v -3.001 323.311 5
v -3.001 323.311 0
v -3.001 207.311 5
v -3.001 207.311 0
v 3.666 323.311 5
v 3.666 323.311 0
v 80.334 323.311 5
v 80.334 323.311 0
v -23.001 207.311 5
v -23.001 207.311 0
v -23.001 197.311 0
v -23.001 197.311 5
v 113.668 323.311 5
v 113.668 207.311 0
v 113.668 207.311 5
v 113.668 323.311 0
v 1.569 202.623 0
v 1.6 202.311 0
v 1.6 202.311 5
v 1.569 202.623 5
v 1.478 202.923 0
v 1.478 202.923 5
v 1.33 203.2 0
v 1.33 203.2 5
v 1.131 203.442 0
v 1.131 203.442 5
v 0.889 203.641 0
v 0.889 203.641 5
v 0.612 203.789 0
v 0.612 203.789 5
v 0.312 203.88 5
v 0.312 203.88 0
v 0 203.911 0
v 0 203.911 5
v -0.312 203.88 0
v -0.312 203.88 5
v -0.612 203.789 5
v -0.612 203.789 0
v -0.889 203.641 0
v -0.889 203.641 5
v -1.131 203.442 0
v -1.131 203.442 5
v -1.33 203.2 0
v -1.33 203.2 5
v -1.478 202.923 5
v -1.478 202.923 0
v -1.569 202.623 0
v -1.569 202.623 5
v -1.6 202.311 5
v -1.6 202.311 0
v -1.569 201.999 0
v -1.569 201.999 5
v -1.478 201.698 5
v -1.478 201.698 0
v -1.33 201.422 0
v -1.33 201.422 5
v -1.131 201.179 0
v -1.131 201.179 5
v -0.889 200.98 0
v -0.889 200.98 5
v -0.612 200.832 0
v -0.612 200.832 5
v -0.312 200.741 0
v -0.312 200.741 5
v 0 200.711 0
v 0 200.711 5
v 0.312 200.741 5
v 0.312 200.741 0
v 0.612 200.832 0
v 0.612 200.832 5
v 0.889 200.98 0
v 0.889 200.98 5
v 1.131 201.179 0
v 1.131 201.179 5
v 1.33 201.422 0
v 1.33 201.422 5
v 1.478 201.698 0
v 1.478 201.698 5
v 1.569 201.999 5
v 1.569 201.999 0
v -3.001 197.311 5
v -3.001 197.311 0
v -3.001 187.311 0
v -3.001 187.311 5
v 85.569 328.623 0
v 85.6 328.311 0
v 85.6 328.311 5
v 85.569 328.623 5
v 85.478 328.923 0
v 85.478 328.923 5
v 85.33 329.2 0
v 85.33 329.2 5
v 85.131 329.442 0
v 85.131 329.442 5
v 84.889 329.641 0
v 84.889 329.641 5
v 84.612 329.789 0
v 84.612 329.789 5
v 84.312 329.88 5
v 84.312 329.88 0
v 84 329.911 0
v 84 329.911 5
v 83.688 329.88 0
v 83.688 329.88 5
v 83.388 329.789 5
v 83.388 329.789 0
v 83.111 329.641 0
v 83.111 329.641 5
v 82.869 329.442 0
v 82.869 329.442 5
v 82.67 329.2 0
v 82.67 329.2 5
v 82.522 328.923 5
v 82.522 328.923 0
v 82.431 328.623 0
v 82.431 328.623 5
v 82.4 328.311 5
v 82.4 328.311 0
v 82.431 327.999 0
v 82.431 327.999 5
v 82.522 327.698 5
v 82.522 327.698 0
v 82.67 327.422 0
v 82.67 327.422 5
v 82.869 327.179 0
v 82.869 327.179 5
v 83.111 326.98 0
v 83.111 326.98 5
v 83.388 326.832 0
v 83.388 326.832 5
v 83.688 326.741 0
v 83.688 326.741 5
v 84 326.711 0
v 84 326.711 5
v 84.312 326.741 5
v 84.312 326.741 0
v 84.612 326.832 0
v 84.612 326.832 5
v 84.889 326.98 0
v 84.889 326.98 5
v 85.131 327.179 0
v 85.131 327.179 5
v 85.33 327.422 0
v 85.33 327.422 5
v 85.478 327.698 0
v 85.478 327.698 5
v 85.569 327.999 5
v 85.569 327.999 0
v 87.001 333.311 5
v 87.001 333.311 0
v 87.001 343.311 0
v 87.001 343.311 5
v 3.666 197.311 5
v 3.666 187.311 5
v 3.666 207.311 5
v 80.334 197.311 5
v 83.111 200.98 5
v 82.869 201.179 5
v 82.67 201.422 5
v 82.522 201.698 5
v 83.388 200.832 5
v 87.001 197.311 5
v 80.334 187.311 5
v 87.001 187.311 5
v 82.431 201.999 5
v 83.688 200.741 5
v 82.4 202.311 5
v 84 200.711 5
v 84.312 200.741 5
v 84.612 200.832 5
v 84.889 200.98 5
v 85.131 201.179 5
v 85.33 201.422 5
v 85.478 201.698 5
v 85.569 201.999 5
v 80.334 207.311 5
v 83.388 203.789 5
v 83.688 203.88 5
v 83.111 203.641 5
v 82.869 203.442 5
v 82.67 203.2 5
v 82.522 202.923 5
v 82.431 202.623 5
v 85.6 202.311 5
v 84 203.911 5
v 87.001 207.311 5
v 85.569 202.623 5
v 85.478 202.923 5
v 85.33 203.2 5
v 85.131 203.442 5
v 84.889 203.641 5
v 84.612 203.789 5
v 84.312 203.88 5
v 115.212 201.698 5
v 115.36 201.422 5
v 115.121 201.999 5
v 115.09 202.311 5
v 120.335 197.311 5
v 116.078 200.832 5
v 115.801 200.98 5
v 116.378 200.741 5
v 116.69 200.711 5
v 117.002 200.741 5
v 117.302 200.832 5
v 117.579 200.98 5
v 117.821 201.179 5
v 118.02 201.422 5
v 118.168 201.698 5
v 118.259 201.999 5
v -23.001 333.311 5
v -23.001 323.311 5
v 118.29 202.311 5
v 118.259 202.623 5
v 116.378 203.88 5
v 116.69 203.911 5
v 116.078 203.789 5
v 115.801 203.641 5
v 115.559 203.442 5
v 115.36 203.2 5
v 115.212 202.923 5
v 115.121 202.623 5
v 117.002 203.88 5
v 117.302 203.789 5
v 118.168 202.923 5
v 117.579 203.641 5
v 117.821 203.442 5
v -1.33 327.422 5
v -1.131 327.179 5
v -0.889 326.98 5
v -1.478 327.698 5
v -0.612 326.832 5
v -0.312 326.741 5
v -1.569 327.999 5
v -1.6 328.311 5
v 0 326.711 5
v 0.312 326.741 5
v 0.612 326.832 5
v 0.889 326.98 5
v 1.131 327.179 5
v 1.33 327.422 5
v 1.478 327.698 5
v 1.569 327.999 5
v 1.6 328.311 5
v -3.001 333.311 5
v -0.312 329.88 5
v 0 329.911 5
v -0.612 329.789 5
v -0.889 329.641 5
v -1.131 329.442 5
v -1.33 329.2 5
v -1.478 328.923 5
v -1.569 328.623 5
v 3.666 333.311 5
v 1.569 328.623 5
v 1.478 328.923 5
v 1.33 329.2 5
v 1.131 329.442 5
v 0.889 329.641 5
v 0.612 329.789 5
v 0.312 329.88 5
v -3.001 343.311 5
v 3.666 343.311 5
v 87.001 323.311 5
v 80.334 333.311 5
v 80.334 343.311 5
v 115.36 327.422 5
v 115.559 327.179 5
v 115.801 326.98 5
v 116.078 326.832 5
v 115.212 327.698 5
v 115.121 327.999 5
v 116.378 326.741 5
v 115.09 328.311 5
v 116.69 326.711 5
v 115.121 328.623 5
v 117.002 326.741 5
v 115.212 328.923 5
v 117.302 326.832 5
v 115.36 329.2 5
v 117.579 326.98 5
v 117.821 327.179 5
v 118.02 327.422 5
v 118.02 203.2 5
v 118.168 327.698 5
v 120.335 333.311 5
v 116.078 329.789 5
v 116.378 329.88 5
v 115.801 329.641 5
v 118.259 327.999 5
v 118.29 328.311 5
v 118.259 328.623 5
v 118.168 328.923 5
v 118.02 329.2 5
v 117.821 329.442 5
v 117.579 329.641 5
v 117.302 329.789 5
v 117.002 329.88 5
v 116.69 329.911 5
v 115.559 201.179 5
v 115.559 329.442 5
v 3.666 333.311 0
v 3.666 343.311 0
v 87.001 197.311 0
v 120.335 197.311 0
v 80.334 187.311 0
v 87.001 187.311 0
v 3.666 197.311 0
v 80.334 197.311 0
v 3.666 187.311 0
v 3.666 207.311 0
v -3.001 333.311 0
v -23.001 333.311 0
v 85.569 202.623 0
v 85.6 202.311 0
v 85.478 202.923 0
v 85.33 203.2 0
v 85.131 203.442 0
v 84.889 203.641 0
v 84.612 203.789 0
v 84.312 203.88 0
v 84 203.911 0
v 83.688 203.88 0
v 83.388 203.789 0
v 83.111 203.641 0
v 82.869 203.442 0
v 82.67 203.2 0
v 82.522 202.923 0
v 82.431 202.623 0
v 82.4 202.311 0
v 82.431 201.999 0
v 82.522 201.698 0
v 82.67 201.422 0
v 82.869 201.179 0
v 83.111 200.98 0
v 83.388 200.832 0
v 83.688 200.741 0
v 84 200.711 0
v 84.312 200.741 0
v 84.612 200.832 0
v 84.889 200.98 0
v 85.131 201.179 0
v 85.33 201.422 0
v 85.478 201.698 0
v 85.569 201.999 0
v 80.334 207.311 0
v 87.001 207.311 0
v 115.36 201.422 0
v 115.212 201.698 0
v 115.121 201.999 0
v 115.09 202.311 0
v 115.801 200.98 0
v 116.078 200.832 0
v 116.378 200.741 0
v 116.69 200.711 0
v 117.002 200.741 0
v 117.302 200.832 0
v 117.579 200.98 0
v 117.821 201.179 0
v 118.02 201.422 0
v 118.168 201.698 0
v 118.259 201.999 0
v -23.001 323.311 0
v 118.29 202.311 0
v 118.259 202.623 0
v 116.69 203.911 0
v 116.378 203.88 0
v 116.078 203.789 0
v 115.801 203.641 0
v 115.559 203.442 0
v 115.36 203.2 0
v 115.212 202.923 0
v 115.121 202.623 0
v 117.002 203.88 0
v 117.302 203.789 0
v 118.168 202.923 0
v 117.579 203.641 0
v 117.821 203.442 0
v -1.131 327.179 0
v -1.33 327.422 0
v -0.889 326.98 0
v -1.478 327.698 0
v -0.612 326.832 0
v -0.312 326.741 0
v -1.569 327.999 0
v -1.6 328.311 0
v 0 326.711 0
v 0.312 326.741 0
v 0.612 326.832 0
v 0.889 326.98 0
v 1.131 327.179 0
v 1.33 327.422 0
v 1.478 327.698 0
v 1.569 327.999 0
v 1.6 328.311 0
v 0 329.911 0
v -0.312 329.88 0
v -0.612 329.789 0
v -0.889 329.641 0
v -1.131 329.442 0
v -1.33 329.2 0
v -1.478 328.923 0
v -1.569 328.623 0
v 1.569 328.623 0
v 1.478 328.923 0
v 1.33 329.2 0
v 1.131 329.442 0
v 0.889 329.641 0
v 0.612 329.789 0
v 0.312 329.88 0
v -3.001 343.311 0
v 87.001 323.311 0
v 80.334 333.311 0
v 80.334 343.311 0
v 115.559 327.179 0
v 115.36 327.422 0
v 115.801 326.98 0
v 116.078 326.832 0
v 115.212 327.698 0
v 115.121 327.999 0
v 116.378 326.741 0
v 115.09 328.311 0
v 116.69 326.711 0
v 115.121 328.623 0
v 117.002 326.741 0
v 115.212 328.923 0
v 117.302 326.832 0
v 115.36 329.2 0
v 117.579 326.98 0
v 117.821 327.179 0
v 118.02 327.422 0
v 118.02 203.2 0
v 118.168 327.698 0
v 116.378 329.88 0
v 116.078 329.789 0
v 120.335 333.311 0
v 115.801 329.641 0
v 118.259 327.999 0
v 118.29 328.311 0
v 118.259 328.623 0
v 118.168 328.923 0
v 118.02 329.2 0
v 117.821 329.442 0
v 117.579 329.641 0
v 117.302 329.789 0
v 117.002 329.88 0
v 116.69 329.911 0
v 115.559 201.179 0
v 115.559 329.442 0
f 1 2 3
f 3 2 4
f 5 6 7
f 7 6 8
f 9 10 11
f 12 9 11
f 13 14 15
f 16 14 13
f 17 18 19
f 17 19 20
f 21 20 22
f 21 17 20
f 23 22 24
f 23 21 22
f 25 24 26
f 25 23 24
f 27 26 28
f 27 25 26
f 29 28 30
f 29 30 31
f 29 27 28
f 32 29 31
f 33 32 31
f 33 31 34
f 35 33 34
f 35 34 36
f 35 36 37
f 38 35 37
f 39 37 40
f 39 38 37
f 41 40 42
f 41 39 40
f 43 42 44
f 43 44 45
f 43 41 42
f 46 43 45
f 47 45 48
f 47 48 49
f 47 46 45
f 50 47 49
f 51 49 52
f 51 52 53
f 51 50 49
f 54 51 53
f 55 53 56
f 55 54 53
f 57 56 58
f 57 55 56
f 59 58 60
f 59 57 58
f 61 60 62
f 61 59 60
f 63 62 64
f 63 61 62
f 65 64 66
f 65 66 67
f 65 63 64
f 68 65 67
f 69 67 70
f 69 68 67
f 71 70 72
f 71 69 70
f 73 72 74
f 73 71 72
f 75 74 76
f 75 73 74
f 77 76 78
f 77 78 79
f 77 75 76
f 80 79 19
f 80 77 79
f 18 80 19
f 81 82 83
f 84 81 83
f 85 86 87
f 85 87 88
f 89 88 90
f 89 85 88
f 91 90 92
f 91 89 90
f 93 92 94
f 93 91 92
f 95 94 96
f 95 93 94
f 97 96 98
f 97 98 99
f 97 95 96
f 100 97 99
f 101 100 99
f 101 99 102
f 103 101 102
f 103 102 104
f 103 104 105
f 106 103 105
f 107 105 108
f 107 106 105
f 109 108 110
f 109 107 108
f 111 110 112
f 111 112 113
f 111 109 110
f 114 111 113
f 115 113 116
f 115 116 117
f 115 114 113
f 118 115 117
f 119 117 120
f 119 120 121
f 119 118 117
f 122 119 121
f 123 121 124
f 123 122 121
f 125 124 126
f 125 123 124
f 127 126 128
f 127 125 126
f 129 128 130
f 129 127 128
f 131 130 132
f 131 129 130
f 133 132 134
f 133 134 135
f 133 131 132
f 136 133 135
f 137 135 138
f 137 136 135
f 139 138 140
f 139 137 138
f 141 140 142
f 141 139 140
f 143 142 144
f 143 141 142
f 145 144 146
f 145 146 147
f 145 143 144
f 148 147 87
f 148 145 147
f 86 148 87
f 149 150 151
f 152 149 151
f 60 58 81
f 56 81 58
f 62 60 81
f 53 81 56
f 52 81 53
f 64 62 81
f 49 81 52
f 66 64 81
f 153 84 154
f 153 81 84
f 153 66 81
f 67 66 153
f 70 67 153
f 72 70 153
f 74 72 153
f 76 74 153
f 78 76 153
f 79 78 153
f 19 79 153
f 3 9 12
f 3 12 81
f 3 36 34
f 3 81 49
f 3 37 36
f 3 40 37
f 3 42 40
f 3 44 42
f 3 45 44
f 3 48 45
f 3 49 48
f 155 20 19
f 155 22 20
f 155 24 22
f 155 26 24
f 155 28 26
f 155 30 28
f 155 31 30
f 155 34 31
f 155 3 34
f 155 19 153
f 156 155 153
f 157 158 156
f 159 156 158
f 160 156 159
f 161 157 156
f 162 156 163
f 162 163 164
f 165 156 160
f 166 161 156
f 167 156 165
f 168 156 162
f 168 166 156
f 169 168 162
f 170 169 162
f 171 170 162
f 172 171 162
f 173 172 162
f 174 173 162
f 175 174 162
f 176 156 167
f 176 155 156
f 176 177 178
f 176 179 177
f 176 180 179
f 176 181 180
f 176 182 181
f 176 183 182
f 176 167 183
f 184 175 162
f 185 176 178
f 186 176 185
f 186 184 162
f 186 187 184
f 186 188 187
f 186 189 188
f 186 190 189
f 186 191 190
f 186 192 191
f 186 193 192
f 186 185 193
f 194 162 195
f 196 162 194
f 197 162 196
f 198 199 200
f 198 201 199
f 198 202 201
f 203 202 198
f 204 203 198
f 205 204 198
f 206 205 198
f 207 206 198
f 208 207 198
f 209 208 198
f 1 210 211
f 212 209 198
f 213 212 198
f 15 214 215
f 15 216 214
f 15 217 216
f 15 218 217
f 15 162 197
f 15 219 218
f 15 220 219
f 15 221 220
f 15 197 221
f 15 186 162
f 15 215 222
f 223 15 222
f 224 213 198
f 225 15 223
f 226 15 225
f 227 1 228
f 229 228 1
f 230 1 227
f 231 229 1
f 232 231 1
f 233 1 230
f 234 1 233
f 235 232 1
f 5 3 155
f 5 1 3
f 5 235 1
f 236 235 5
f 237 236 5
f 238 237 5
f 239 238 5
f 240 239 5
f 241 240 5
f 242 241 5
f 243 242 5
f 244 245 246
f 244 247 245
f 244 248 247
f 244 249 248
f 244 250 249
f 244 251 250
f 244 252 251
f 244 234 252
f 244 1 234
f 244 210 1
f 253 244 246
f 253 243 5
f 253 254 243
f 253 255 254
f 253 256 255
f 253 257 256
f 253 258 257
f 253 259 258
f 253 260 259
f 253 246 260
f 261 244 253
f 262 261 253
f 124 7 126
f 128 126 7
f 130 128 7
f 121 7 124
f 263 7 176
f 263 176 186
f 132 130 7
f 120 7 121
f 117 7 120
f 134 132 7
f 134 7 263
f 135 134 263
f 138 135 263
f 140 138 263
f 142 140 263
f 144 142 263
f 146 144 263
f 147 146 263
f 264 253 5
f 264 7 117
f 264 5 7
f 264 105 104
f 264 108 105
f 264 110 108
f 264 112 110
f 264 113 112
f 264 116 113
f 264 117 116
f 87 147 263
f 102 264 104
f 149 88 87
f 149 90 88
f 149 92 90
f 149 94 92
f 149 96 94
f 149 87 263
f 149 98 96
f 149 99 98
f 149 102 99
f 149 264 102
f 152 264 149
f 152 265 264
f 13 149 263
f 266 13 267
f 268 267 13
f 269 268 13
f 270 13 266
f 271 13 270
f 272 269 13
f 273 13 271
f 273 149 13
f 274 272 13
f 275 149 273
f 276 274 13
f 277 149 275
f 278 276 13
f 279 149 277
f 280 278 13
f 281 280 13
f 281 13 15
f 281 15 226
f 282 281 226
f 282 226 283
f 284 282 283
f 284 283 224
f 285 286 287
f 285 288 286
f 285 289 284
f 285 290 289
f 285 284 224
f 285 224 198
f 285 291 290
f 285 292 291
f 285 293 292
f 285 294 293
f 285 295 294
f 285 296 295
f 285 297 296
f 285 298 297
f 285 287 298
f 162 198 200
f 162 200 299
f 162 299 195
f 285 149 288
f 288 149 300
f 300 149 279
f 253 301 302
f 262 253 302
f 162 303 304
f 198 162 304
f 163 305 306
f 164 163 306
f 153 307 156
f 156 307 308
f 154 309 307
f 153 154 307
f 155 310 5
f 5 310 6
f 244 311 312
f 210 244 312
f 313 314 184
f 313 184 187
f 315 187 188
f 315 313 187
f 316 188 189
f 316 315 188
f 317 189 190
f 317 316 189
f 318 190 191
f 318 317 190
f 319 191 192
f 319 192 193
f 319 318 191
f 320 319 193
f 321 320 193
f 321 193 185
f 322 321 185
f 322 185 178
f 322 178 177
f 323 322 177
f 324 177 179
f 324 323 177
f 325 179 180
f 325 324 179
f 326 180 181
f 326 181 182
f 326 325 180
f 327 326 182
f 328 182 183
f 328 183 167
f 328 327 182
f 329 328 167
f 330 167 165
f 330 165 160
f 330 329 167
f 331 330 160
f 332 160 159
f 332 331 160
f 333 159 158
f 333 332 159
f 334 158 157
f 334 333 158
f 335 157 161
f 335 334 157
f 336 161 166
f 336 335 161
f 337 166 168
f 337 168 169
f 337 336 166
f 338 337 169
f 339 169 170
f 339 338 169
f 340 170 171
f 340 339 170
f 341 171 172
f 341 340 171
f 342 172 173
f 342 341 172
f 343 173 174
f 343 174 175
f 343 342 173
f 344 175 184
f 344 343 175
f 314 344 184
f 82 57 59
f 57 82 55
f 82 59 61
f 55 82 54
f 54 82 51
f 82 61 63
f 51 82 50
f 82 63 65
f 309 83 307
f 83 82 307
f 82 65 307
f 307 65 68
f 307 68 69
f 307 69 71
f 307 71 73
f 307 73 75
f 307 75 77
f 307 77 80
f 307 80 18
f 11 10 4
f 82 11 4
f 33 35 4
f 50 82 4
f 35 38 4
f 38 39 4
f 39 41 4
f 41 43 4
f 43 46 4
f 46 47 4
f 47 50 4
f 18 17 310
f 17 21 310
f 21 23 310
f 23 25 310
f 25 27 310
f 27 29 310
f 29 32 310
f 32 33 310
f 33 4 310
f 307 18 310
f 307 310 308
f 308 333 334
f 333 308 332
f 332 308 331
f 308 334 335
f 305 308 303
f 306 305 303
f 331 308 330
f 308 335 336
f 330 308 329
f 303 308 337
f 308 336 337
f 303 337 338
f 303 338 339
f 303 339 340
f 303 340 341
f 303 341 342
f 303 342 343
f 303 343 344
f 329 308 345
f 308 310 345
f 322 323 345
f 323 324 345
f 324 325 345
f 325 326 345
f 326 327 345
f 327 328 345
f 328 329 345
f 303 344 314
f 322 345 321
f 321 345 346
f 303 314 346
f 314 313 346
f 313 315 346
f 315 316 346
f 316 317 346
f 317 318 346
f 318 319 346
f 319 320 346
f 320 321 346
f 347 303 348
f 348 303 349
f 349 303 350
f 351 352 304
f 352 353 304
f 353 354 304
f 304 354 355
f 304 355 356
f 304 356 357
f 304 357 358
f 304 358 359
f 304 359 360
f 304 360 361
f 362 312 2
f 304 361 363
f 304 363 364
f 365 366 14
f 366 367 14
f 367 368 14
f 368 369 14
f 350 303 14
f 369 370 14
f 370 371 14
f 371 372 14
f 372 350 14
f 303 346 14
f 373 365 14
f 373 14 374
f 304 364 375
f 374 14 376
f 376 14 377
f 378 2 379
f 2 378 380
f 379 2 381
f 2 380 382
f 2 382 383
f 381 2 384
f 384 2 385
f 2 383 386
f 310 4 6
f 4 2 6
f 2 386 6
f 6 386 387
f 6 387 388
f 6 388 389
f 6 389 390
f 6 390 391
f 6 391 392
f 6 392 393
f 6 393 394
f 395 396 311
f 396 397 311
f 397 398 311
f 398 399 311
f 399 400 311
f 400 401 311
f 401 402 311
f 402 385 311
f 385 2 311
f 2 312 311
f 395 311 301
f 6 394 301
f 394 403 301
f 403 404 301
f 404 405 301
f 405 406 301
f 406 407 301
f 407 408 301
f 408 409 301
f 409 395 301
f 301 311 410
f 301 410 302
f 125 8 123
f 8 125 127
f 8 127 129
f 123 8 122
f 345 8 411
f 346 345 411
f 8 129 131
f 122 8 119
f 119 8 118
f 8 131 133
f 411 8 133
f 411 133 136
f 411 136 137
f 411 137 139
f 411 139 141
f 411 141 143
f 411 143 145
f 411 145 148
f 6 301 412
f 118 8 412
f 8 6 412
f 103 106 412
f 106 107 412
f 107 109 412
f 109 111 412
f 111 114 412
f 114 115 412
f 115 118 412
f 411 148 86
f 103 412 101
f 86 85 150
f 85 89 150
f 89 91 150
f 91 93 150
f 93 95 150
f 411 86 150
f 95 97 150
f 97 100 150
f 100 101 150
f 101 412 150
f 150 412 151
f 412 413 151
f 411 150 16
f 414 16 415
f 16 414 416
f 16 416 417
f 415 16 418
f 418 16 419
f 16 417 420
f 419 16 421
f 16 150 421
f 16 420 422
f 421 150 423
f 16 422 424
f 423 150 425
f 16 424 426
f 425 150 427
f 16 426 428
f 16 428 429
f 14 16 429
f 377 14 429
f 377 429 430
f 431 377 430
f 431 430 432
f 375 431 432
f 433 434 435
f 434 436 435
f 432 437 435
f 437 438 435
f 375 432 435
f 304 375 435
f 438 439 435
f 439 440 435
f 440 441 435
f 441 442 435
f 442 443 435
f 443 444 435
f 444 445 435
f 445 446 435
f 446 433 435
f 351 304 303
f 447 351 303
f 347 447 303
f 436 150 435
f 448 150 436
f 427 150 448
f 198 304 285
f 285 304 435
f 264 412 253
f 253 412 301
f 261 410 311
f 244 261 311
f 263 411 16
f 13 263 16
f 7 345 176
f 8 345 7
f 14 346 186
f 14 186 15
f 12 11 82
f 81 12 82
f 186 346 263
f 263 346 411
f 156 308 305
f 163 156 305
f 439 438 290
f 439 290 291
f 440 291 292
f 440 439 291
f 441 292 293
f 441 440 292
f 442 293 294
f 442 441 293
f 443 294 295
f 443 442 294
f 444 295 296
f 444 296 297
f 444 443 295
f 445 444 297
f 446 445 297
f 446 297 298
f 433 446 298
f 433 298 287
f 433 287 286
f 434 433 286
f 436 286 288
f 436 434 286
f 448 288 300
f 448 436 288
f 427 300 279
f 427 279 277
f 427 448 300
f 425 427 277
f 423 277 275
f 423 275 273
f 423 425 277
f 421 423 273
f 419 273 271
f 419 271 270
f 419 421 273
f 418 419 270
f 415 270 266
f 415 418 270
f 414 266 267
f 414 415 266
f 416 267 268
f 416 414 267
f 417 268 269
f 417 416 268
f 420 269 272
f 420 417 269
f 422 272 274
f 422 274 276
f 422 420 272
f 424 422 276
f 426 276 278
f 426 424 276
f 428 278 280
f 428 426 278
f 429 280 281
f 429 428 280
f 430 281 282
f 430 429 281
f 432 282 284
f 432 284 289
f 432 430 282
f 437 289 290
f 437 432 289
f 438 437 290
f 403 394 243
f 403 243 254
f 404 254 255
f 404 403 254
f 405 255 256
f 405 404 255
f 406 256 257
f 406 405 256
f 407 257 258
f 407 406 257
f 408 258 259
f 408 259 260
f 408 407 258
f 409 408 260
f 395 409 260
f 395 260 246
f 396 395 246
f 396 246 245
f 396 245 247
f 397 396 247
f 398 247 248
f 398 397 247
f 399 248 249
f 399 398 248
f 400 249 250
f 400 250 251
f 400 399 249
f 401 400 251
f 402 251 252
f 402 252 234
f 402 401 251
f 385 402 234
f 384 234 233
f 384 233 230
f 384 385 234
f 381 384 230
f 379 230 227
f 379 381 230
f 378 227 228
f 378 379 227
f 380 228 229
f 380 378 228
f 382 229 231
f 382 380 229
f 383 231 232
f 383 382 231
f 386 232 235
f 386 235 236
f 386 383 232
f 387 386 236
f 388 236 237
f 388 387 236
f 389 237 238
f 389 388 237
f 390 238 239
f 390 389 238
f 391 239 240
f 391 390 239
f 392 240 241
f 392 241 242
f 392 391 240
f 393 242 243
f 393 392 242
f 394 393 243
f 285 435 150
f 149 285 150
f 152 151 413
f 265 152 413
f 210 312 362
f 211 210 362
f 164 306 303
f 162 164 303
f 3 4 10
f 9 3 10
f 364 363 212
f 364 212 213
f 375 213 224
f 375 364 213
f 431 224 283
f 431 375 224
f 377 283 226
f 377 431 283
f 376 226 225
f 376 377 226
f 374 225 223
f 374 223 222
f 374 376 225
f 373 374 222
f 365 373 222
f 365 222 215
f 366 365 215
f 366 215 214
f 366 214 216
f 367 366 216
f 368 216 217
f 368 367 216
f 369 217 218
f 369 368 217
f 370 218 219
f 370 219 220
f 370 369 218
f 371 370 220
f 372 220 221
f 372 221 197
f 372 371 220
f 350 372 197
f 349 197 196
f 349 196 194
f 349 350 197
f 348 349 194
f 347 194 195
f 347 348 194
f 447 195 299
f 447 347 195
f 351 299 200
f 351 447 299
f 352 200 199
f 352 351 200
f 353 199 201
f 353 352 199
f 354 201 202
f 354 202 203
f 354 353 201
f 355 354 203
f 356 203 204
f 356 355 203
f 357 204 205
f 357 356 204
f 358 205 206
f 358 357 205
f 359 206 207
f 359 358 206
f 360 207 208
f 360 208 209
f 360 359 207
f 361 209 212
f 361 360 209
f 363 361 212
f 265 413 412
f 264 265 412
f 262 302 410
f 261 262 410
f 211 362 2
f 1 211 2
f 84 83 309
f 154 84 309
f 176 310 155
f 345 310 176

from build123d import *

# Parameters (mm, degrees)
F1_R     = 1.6
F1_W     = 76.668
F1_H     = 116
F1_W_2   = 26.667
F2_DEPTH = 5


with BuildPart() as f2:
    # F1 (on Top) → F2 (new body)
    with BuildSketch(Plane.XY):
        Polygon((-3.001, 187.310685), (3.666, 187.310685), (3.666, 197.310685), (80.334, 197.310685), (80.334, 187.310685), (87.001, 187.310685), (87.001, 197.310685), (113.668, 197.310685), (120.335, 197.310685), (120.335, 333.310685), (113.668, 333.310685), (87.001, 333.310685), (87.001, 343.310685), (80.334, 343.310685), (80.334, 333.310685), (3.666, 333.310685), (3.666, 343.310685), (-3.001, 343.310685), (-3.001, 333.310685), (-23.001, 333.310685), (-23.001, 323.310685), (-3.001, 323.310685), (-3.001, 207.310685), (-23.001, 207.310685), (-23.001, 197.310685), (-3.001, 197.310685), align=None)
        with Locations((0, 202.310685)):
            Circle(F1_R, mode=Mode.SUBTRACT)
        with Locations((42, 265.310685)):
            Rectangle(F1_W, F1_H, mode=Mode.SUBTRACT)
        with Locations((84, 202.310685)):
            Circle(F1_R, mode=Mode.SUBTRACT)
        with Locations((116.69, 202.310685)):
            Circle(F1_R, mode=Mode.SUBTRACT)
        with Locations((100.3345, 265.310685)):
            Rectangle(F1_W_2, F1_H, mode=Mode.SUBTRACT)
        with Locations((0, 328.310685)):
            Circle(F1_R, mode=Mode.SUBTRACT)
        with Locations((84, 328.310685)):
            Circle(F1_R, mode=Mode.SUBTRACT)
        with Locations((116.69, 328.310685)):
            Circle(F1_R, mode=Mode.SUBTRACT)
    extrude(amount=F2_DEPTH)


solid = f2.part
